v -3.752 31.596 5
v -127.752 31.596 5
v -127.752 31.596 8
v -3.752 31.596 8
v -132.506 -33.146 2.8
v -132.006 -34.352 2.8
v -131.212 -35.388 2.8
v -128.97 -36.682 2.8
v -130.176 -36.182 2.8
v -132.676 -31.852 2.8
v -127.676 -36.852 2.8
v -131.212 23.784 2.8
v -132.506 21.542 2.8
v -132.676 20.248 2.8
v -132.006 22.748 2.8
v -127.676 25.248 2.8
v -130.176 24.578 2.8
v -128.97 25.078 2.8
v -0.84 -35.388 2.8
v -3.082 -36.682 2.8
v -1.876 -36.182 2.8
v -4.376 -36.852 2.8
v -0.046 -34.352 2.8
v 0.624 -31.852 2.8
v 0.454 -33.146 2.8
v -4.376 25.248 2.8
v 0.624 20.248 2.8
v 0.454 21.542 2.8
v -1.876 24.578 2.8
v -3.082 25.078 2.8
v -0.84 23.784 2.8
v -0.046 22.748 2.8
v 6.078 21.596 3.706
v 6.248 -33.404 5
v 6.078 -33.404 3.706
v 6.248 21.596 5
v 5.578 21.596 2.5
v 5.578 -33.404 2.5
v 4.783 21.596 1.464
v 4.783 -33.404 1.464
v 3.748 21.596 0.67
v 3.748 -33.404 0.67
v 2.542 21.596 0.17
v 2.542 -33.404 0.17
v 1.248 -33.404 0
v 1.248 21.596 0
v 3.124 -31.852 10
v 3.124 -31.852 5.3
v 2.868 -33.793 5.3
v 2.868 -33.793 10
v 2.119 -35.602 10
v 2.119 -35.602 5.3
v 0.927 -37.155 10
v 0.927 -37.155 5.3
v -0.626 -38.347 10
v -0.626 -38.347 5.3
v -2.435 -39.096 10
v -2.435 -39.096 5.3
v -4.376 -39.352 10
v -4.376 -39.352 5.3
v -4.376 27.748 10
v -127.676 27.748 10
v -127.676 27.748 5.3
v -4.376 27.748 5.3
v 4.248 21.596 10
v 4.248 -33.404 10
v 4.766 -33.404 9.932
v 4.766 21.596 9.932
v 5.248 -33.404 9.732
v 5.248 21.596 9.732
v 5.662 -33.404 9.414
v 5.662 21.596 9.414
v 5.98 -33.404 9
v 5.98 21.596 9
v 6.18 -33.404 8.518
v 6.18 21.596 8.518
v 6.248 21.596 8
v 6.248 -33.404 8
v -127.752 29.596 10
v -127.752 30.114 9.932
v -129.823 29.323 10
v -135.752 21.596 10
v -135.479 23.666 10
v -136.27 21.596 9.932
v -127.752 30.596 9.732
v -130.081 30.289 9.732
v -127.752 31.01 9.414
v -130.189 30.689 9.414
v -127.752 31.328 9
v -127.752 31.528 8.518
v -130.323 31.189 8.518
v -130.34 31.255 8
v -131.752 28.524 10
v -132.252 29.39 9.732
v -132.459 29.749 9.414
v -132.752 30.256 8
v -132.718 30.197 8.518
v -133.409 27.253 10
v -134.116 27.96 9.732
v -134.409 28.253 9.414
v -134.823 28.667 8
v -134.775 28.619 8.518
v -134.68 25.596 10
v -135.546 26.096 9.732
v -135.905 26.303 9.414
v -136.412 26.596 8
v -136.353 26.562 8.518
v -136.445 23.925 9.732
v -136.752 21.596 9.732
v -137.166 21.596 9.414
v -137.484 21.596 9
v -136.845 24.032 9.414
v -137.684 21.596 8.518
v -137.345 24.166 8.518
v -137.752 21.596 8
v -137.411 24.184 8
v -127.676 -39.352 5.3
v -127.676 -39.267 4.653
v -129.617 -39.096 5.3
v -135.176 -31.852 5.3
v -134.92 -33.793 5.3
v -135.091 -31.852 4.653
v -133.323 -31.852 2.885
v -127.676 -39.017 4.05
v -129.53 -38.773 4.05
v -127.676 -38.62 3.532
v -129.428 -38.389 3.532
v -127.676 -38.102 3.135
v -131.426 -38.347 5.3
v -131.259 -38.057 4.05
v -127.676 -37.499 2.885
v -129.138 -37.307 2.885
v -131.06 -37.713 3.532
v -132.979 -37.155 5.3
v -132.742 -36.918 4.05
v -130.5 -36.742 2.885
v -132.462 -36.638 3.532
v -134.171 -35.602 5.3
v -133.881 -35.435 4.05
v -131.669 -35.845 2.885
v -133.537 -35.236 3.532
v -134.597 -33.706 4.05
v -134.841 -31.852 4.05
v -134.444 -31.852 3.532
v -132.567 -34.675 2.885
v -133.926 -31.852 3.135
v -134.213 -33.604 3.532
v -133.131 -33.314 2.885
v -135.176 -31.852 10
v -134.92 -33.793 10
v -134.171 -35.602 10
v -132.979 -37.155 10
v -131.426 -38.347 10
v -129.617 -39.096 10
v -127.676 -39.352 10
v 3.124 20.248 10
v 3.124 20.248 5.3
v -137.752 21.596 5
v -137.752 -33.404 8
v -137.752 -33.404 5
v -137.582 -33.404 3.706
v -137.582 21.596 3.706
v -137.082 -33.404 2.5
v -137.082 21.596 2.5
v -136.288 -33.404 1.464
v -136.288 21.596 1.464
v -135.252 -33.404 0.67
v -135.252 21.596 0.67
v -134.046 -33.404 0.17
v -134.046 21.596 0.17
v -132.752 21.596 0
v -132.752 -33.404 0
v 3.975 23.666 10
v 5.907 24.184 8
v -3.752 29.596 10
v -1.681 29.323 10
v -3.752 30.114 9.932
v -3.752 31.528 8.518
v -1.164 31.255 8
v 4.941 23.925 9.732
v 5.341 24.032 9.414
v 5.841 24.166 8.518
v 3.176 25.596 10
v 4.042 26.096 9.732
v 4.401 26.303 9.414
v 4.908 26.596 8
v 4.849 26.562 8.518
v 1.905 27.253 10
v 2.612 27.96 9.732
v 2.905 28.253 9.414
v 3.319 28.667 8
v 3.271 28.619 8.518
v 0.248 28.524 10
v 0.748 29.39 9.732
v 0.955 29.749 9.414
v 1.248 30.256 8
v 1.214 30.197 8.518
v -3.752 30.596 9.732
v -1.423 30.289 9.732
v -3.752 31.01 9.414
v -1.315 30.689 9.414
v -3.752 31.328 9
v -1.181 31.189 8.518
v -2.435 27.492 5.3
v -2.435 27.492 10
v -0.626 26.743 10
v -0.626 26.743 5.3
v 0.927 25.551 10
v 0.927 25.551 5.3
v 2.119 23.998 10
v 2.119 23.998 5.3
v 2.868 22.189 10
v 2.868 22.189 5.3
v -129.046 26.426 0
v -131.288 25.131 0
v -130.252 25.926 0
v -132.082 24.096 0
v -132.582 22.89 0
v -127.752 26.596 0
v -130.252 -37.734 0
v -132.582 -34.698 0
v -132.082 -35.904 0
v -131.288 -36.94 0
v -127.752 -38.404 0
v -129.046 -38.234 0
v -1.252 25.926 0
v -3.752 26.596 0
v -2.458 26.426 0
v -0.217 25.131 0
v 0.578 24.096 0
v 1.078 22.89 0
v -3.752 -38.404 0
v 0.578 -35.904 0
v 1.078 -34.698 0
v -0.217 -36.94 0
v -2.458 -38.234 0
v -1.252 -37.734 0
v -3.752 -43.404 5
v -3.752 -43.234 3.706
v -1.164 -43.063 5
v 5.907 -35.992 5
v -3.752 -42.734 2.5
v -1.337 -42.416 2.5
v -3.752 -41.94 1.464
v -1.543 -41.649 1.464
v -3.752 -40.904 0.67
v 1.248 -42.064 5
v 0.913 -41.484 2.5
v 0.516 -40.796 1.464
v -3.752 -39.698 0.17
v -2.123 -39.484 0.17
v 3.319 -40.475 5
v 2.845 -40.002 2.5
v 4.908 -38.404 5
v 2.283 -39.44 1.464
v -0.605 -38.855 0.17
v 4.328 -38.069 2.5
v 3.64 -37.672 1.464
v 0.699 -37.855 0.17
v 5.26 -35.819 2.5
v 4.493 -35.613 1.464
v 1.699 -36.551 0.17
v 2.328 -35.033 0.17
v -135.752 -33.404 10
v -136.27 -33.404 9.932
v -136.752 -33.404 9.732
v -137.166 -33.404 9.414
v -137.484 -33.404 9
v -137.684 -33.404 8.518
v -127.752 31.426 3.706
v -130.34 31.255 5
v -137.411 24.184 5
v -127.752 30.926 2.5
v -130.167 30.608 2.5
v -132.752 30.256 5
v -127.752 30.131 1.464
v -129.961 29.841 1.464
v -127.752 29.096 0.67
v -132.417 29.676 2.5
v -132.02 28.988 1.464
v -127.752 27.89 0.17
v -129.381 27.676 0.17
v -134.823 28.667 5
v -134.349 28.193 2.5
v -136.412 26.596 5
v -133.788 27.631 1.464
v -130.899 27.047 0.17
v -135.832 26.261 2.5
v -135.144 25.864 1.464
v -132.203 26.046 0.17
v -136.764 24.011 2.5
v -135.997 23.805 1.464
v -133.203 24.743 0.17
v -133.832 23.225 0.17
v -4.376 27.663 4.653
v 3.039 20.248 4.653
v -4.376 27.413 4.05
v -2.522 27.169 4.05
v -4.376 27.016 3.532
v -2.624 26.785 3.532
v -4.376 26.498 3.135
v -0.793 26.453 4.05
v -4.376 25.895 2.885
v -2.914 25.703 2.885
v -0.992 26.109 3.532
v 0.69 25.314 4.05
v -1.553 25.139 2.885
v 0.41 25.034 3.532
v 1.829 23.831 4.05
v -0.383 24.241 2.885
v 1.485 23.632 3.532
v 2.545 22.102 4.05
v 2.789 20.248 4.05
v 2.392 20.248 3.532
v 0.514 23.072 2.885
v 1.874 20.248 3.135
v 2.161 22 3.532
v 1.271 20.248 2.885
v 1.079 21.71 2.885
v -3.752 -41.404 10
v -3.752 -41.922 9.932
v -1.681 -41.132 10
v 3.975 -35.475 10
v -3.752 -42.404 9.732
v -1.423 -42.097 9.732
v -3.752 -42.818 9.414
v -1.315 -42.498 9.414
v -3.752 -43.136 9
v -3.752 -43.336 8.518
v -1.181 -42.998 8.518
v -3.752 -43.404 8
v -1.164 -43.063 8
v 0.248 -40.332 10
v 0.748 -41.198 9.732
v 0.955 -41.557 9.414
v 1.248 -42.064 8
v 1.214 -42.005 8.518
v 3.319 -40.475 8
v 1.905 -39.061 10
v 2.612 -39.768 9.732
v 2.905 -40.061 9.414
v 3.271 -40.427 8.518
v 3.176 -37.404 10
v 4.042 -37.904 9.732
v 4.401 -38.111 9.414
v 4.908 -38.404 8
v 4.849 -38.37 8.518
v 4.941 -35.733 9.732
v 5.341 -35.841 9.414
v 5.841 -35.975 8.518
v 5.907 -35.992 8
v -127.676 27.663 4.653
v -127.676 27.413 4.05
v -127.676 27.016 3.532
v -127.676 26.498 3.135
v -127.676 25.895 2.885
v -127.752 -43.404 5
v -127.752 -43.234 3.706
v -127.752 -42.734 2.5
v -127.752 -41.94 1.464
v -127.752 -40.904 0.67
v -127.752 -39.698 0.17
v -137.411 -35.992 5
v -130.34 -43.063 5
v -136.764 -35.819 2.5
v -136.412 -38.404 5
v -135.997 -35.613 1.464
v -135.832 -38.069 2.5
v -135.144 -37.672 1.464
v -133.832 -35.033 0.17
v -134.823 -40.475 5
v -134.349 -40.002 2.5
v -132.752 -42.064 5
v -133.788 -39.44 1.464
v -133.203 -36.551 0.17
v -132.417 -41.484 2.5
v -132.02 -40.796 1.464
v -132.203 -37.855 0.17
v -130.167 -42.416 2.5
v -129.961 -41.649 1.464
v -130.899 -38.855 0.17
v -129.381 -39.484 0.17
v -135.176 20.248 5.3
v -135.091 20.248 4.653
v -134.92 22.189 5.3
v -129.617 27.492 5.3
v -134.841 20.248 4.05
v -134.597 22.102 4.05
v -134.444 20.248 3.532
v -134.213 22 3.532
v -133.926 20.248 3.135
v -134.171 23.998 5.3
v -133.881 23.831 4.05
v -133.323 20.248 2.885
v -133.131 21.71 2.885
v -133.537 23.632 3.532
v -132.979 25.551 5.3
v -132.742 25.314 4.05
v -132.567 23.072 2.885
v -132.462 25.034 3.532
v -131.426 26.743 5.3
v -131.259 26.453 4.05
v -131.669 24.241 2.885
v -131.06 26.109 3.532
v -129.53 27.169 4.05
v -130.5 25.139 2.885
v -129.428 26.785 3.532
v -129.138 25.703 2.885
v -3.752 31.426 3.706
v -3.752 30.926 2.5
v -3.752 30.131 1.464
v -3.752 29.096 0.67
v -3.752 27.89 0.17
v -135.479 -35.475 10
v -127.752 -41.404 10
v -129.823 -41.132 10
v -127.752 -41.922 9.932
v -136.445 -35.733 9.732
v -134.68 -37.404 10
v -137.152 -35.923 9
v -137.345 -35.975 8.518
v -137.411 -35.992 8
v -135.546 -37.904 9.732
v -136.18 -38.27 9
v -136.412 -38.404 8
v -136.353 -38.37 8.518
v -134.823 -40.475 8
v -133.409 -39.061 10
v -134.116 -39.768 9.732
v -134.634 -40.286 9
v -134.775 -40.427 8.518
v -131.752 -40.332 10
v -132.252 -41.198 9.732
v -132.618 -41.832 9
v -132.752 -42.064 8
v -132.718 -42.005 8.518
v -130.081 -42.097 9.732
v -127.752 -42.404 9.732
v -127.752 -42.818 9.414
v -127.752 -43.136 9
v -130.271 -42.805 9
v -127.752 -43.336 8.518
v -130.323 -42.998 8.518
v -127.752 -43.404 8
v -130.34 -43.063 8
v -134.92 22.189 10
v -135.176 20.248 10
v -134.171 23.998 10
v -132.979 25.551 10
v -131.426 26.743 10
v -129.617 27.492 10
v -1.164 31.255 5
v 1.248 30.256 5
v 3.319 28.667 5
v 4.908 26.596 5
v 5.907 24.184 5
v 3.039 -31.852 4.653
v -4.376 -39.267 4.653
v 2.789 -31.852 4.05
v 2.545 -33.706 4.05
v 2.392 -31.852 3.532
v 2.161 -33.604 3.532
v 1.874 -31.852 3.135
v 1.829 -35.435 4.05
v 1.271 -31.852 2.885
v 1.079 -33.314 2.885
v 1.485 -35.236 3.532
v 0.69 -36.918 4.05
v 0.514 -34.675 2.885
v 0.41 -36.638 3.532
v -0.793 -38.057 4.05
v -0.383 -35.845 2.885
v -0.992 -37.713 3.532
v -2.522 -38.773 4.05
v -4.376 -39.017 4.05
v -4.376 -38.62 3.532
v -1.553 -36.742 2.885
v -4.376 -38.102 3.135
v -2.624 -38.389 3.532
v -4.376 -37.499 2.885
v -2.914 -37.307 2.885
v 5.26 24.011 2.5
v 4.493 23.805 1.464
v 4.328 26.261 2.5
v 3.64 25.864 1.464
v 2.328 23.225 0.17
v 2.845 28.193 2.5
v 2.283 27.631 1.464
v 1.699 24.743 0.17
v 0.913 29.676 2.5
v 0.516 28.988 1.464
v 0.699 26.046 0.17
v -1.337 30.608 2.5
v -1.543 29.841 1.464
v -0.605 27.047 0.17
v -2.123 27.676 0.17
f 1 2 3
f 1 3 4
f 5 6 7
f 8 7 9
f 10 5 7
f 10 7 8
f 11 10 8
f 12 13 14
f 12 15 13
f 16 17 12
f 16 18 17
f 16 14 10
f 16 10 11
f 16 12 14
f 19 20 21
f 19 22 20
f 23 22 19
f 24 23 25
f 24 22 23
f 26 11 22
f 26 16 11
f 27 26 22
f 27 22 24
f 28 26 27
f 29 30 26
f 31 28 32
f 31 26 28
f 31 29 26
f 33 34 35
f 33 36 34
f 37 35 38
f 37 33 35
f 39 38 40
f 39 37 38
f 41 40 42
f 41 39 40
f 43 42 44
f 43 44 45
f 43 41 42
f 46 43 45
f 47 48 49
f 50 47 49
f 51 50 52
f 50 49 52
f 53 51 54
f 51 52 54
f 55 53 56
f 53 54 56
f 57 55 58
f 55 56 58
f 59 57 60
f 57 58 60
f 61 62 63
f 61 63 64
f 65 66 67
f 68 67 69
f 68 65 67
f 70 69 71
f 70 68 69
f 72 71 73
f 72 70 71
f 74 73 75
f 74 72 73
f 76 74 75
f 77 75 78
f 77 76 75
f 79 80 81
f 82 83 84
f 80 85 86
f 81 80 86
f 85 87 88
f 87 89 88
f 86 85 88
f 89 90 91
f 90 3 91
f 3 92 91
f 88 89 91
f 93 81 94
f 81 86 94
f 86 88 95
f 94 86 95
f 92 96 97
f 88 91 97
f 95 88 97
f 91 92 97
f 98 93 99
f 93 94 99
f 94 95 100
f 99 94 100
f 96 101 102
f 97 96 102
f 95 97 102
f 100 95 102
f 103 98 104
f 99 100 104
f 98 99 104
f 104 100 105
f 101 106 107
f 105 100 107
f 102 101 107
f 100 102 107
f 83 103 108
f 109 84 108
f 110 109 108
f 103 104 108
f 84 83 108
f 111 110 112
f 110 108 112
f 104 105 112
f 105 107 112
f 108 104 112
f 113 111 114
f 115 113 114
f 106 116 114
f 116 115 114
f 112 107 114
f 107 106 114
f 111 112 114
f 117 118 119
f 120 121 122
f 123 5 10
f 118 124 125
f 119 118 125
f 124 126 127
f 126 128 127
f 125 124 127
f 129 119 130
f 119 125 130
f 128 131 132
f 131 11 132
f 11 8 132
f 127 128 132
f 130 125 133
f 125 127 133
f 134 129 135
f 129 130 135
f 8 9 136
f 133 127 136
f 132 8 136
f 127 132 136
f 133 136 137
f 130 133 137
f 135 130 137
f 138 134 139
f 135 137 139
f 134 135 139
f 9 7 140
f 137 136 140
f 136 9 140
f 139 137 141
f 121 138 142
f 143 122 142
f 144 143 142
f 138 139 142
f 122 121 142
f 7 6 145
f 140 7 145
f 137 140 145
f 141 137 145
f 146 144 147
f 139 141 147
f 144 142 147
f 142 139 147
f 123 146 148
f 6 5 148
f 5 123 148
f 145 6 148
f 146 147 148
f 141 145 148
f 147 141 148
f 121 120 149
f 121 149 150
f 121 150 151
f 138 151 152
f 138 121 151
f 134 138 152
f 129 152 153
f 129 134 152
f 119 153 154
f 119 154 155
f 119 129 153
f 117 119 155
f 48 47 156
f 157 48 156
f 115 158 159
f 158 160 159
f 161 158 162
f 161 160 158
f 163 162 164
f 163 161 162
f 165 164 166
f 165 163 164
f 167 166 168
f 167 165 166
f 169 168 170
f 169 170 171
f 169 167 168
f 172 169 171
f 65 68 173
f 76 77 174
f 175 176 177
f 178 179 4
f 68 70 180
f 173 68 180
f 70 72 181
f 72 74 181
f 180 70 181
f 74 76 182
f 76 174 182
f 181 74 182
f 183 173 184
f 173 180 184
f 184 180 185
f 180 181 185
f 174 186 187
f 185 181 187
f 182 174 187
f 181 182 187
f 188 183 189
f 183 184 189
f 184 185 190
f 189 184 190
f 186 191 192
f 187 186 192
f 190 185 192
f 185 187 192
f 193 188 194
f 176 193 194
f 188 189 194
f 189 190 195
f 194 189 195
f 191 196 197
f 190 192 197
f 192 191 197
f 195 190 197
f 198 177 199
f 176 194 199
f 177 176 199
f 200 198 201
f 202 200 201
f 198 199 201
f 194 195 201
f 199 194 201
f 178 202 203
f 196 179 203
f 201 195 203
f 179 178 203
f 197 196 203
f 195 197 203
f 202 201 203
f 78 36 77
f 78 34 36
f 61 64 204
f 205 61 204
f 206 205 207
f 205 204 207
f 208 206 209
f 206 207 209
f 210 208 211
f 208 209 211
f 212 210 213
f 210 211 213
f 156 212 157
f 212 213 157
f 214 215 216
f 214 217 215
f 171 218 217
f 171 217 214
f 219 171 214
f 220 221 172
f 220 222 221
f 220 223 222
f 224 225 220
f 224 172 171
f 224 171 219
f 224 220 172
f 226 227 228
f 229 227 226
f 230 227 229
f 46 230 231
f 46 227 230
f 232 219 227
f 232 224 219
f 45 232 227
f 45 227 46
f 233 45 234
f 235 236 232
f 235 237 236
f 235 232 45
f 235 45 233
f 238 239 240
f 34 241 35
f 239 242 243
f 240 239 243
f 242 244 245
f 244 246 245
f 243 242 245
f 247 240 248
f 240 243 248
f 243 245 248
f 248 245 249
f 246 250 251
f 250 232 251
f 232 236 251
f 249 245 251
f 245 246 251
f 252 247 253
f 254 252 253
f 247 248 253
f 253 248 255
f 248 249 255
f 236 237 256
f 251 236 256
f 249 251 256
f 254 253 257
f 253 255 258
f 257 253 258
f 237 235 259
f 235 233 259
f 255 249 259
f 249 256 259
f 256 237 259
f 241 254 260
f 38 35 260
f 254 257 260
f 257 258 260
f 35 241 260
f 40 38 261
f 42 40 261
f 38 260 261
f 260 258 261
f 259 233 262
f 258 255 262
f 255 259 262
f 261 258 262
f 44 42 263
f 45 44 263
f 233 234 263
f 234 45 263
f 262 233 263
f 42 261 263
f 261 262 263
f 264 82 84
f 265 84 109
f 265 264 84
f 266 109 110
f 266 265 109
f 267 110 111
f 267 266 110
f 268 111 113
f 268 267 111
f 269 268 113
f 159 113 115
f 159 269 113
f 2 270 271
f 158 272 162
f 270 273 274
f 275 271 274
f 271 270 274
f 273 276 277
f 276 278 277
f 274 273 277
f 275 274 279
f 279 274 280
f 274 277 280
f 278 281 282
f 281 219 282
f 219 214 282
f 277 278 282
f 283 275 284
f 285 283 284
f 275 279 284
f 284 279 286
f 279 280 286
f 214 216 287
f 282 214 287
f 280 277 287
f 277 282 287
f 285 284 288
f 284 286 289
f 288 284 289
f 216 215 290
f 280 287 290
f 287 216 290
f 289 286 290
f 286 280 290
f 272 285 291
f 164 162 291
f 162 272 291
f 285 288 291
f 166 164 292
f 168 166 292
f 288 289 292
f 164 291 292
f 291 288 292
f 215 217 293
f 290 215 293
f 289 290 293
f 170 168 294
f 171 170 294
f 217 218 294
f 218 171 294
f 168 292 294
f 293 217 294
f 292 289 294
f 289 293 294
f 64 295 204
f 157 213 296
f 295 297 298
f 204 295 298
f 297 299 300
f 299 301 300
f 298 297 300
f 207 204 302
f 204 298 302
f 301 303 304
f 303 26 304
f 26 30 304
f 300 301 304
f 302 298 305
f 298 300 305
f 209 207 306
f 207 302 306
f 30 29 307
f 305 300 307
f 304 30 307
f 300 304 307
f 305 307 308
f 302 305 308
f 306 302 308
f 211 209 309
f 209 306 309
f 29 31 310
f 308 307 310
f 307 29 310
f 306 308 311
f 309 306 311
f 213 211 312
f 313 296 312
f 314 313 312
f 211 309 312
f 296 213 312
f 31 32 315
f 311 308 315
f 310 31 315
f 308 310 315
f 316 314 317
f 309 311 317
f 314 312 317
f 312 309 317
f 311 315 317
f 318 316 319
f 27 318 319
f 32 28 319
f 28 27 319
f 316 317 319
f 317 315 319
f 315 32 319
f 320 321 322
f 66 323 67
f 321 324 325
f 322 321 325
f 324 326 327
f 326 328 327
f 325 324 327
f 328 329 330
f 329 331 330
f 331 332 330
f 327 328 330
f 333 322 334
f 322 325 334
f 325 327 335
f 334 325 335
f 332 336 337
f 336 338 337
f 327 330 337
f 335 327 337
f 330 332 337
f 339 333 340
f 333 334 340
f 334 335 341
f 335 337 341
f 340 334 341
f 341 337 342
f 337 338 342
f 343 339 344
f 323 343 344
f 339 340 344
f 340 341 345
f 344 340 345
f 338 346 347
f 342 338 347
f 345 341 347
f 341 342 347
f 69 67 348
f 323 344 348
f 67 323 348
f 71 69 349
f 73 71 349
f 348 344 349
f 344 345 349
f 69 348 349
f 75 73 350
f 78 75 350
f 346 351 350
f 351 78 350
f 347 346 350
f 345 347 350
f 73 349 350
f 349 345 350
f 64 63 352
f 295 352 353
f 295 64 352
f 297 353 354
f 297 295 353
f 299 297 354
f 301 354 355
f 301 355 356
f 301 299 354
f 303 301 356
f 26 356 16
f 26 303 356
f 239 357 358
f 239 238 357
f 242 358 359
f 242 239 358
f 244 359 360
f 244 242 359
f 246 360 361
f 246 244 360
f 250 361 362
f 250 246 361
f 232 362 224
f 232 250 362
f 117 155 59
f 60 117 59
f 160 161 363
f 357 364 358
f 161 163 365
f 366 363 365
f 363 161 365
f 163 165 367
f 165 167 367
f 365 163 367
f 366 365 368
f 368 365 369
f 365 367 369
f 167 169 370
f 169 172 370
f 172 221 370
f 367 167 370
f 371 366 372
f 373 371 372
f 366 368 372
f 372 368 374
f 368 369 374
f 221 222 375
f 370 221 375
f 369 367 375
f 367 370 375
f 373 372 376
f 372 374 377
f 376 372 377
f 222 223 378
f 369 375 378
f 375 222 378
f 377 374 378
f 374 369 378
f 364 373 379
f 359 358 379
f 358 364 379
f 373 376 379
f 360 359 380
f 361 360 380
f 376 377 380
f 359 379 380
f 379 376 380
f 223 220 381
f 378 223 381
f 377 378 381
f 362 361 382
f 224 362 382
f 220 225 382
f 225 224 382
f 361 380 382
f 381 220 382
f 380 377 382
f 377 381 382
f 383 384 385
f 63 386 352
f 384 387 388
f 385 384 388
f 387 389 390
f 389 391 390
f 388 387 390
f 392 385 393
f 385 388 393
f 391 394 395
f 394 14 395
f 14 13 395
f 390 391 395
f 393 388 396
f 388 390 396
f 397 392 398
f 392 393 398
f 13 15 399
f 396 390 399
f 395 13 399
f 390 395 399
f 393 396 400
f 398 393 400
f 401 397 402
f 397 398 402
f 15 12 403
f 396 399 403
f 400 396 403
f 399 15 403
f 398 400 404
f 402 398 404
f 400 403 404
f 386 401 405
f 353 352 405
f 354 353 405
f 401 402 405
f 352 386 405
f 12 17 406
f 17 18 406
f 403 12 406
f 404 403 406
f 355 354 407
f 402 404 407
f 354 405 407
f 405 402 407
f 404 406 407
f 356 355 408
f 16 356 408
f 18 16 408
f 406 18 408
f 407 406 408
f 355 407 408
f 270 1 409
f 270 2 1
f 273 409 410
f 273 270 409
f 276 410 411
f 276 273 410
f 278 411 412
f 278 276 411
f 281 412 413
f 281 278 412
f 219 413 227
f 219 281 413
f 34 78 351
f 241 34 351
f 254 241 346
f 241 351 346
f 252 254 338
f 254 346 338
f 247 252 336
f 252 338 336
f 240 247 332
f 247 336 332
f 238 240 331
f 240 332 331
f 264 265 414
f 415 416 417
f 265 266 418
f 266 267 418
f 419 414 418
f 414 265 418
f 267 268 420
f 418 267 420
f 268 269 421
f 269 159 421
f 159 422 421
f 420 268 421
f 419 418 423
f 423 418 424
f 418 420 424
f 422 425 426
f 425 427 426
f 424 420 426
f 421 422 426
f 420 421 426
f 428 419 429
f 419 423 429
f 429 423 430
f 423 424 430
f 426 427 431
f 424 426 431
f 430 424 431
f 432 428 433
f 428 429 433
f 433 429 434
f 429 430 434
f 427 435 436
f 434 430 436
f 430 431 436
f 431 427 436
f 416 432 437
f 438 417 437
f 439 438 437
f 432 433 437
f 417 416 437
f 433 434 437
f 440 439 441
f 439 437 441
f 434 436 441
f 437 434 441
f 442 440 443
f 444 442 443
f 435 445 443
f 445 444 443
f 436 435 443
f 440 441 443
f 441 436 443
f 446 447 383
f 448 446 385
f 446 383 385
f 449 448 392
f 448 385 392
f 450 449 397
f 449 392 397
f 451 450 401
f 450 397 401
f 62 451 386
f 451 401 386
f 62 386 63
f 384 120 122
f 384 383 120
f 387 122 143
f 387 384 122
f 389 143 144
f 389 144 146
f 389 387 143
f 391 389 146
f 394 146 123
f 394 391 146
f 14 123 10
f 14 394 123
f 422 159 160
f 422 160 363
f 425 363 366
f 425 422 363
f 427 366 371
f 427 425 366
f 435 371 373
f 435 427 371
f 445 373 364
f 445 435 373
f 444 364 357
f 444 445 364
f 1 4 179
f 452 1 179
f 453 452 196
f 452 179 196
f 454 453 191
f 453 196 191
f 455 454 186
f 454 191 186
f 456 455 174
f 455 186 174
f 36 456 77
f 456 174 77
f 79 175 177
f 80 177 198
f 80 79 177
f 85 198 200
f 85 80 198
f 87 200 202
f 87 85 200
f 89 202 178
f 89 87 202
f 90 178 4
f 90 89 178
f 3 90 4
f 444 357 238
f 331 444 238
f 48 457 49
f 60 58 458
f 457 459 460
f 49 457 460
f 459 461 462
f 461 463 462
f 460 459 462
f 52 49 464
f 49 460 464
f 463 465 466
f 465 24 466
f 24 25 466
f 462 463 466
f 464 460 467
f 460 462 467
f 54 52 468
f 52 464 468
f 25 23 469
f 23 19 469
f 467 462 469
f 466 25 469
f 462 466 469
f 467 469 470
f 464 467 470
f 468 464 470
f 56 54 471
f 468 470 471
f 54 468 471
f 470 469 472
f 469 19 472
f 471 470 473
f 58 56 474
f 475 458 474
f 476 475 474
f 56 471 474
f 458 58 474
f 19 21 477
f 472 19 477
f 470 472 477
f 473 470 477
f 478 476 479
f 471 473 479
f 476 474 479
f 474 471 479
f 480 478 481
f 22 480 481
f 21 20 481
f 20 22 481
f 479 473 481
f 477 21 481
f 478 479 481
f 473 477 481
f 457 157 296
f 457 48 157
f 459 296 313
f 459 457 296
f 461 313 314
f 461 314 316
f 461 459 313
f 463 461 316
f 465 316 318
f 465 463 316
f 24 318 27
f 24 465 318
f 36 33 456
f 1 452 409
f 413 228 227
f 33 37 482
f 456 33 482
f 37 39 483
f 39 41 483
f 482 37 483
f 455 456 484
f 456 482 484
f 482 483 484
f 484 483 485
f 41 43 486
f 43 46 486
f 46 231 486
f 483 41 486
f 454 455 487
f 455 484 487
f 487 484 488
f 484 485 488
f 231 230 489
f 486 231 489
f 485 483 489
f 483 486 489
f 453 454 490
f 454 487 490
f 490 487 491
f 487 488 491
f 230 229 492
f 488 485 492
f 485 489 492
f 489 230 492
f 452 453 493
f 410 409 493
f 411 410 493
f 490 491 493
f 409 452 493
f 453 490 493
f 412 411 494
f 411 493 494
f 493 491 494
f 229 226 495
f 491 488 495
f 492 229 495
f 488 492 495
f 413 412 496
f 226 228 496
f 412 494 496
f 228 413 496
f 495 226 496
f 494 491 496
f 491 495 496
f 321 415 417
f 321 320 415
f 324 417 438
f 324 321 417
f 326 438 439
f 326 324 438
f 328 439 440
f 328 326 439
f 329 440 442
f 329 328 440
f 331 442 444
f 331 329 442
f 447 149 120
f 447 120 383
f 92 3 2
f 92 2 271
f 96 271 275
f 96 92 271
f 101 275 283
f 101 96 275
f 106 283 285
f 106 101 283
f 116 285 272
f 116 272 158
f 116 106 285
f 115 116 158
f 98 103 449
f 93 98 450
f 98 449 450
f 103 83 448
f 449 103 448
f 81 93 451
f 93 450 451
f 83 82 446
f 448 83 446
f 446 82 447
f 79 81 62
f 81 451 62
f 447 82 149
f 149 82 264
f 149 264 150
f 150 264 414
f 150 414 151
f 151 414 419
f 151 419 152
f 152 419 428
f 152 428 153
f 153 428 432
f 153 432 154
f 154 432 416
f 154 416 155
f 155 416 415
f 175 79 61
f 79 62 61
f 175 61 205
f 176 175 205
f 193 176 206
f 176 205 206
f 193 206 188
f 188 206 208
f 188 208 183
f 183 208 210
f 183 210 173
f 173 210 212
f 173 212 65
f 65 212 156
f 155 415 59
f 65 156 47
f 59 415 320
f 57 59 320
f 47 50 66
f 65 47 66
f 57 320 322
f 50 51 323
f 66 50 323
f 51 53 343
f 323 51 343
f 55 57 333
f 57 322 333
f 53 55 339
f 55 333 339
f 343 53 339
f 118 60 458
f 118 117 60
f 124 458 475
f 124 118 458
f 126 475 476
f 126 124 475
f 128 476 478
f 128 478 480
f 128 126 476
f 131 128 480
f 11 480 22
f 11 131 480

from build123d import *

# Parameters (mm, degrees)
F0_W     = 144
F0_H     = 72
F1_DEPTH = 10
F3_DEPTH = 3
F2_W     = 138.3
F2_H     = 67.1
F4_DEPTH = 7.2
F5_R     = 7.5
F6_R     = 2.5
F7_R     = 10
F8_R     = 2
F9_R     = 5


with BuildPart() as f1:
    # F0 (on Top) → F1 (new body)
    with BuildSketch(Plane.XY):
        with Locations((-65.7520391978, -7.4041044508)):
            Rectangle(F0_W, F0_H)
    extrude(amount=F1_DEPTH)

    # F3 (add): a face of the model
    f3_faces = [f1.faces().sort_by_distance(p)[0] for p in [
        (-65.7520391978, 28.5958955492, 5),
    ]]
    extrude(f3_faces, amount=F3_DEPTH)

    # F2 (on face) → F4 (cut)
    with BuildSketch(Plane.XY.offset(10)):
        with Locations((-66.0260241712, -5.8019728968)):
            Rectangle(F2_W, F2_H)
    extrude(amount=-F4_DEPTH, mode=Mode.SUBTRACT)

    # F5
    f5_edges = [f1.edges().sort_by_distance(p)[0] for p in [
        (-135.176024, 27.748027, 6.4),
        (-135.176024, -39.351973, 6.4),
        (3.123976, -39.351973, 6.4),
        (3.123976, 27.748027, 6.4),
    ]]
    fillet(f5_edges, radius=F5_R)

    # F6
    f6_edges = [f1.edges().sort_by_distance(p)[0] for p in [
        (-66.026024, 27.748027, 2.8),
    ]]
    fillet(f6_edges, radius=F6_R)

    # F7
    f7_edges = [f1.edges().sort_by_distance(p)[0] for p in [
        (-137.752039, -43.404104, 5),
        (6.247961, -43.404104, 5),
        (6.247961, 31.595896, 5),
        (-137.752039, 31.595896, 5),
    ]]
    fillet(f7_edges, radius=F7_R)

    # F8
    f8_edges = [f1.edges().sort_by_distance(p)[0] for p in [
        (-65.752039, -43.404104, 10),
        (-65.752039, 31.595896, 10),
        (-137.752039, -5.904104, 10),
    ]]
    fillet(f8_edges, radius=F8_R)

    # F9
    f9_edges = [f1.edges().sort_by_distance(p)[0] for p in [
        (-65.752039, -43.404104, 0),
        (-134.823107, -40.475172, 0),
        (3.319029, -40.475172, 0),
        (-137.752039, -5.904104, 0),
        (6.247961, -5.904104, 0),
        (-134.823107, 28.666963, 0),
        (3.319029, 28.666963, 0),
        (-65.752039, 31.595896, 0),
    ]]
    fillet(f9_edges, radius=F9_R)


solid = f1.part
